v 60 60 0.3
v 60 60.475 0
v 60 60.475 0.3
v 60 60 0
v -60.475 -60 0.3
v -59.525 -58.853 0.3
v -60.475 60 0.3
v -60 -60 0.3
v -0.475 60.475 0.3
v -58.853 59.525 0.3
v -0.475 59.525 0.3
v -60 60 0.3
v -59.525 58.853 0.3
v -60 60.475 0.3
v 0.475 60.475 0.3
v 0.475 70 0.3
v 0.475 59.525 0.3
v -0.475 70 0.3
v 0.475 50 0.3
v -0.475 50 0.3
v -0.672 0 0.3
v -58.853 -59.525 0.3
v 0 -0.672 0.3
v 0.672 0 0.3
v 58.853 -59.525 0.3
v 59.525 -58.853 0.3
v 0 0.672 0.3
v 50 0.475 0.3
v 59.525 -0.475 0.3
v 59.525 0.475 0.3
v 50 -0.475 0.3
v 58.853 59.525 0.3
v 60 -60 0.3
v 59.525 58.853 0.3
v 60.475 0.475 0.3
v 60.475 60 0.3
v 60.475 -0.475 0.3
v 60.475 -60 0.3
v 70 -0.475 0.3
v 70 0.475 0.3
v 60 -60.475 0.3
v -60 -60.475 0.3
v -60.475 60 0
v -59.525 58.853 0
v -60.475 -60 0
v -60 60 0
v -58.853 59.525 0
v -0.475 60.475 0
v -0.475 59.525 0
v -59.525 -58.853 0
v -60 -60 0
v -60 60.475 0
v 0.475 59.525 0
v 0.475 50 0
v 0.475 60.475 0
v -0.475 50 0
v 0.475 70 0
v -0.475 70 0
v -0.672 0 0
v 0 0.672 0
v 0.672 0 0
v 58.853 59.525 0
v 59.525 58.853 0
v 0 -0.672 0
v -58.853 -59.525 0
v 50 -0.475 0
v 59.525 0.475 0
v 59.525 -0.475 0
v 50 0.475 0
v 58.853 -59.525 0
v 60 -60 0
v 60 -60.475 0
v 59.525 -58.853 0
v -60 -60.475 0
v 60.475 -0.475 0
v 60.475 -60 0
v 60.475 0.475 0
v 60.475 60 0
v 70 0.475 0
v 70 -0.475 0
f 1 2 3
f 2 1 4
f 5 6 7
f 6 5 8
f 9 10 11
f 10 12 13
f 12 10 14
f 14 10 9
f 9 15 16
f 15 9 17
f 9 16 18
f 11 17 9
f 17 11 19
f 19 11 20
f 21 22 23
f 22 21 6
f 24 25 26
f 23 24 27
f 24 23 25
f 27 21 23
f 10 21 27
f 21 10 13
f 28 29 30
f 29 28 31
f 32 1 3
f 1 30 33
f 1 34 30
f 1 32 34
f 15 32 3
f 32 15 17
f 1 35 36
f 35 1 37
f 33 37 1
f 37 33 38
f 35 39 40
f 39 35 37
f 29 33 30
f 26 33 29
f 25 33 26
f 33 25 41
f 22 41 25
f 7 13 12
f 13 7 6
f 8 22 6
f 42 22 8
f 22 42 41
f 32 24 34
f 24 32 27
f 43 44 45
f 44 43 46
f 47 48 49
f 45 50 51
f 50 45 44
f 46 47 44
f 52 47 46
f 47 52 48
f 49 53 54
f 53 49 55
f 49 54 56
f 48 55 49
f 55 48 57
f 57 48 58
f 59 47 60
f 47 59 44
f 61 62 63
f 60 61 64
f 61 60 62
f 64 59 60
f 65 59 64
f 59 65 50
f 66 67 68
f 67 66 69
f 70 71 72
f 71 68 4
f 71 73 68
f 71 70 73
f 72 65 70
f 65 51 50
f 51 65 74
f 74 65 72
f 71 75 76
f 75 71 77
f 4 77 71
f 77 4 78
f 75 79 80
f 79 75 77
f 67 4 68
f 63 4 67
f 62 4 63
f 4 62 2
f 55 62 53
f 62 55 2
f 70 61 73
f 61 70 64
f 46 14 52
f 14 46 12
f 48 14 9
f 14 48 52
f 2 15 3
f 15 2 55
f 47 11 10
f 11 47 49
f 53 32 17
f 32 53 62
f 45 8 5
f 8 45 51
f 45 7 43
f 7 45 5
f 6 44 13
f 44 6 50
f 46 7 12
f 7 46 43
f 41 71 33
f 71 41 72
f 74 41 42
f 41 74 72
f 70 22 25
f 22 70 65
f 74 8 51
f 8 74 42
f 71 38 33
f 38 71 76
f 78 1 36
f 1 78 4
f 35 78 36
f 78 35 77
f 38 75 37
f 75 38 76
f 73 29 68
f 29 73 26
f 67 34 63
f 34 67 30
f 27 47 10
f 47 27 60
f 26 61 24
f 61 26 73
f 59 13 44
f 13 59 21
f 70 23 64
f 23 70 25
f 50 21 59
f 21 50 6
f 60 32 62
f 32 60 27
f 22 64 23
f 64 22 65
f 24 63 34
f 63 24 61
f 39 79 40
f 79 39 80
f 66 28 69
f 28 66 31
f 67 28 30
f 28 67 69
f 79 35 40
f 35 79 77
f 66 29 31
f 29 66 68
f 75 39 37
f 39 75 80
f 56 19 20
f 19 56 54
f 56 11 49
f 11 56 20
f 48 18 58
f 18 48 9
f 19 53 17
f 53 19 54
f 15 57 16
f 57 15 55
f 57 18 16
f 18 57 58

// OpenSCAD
// Platform Level test pattern
// Ed Nisley KE4ZNU - Dec 2011

// Successfully printing objects requires accurate build platform
// alignment. I find that 0.25 mm layers require leveling within about
// +/-0.05 mm across the entire platform.

// This OpenSCAD program generates an object with bars exactly one thread
// tall and two threads wide. Skeinforge (or your favorite slicer)
// converts the STL file into G-Code that will produce a very short and
// thin plastic extrusion that reveals any misalignment.

// Update: You must modify the OpenSCAD source to match your Skeinforge
// settings. The STL file is set for 0.25 mm thickness and 0.50 mm width,
// so it won't produce the correct G-Code for other printing
// parameters. It will (probably) print something that you can use for
// platform leveling, but the bars won't be exactly one-high by two-wide.

// After printing, cooling, and removing the pattern, measure the
// thickness with calipers. Each bar should exactly match the Skeinforge
// layer thickness; if it doesn't, then you know which part of the
// platform to adjust.

// My (extensively modified) Thing-O-Matic has a double aluminum plate
// build platform with three M3x0.5 mm adjusting screws at the left
// front, left rear, and right center mounting holes. Measuring the bar
// thicknesses near those screws directly indicates the required
// adjustment.

// It also has a Z-minimum platform height sensor switch, so I simply
// adjust the screws to level the platform; my start.gcode routine
// measures and sets the correct Z=0 position. Without that sensor, you
// must adjust the screws to eliminate the tilt and set the height to
// match the layer thickness.

// The overall printed width of each bar should match the Skeinforge W/T
// setting. For example, with 0.25 mm thickness and W/T=2.0, the bars
// should be 2 x 2 x 0.25 = 1.00 mm wide. This is very sensitive to the
// actual printed thickness.

// Two tabs mark the +X and +Y axis directions so you can figure out
// where to make the corrections. The bottom surface will be shinier than
// the top, indicating which side was down.

// More details and background on my blog at
// http://softsolder.com/2012/01/10/platform-level-test-pattern/.

//-------
//- Extrusion parameters must match reality!

ThreadThick = 0.3;   // Extrusion thickness of first layer in Slic3r
ThreadWidth = 0.475; // Extrusion width of first layer in Slic3r minus a bit as Slic3r is enthusiastic

//-------
// Dimensions
small = (1==0);

BoxSize = small ? 80 : 120;

//-------

module ShowPegGrid(Space = 10.0,Size = 1.0) {

  Range = floor(50 / Space);
  for (x=[-Range:Range])
    for (y=[-Range:Range])
      translate([x*Space,y*Space,Size/2])
        %cube(Size,center=true);
}

//-------

ShowPegGrid();

for (Index=[0:3])
  rotate(Index*90)
    translate([0,BoxSize/2,ThreadThick/2])
      cube([BoxSize,2*ThreadWidth,ThreadThick],center=true);

for (Index=[-1,1])
  rotate(Index*45)
    translate([0,0,ThreadThick/2])
      cube([sqrt(2)*BoxSize,2*ThreadWidth,ThreadThick],center=true);

translate([BoxSize/2,0,ThreadThick/2])
  cube([BoxSize/6,2*ThreadWidth,ThreadThick],center=true);

translate([0,BoxSize/2,ThreadThick/2])
  rotate(90)
    cube([BoxSize/6,2*ThreadWidth,ThreadThick],center=true);
